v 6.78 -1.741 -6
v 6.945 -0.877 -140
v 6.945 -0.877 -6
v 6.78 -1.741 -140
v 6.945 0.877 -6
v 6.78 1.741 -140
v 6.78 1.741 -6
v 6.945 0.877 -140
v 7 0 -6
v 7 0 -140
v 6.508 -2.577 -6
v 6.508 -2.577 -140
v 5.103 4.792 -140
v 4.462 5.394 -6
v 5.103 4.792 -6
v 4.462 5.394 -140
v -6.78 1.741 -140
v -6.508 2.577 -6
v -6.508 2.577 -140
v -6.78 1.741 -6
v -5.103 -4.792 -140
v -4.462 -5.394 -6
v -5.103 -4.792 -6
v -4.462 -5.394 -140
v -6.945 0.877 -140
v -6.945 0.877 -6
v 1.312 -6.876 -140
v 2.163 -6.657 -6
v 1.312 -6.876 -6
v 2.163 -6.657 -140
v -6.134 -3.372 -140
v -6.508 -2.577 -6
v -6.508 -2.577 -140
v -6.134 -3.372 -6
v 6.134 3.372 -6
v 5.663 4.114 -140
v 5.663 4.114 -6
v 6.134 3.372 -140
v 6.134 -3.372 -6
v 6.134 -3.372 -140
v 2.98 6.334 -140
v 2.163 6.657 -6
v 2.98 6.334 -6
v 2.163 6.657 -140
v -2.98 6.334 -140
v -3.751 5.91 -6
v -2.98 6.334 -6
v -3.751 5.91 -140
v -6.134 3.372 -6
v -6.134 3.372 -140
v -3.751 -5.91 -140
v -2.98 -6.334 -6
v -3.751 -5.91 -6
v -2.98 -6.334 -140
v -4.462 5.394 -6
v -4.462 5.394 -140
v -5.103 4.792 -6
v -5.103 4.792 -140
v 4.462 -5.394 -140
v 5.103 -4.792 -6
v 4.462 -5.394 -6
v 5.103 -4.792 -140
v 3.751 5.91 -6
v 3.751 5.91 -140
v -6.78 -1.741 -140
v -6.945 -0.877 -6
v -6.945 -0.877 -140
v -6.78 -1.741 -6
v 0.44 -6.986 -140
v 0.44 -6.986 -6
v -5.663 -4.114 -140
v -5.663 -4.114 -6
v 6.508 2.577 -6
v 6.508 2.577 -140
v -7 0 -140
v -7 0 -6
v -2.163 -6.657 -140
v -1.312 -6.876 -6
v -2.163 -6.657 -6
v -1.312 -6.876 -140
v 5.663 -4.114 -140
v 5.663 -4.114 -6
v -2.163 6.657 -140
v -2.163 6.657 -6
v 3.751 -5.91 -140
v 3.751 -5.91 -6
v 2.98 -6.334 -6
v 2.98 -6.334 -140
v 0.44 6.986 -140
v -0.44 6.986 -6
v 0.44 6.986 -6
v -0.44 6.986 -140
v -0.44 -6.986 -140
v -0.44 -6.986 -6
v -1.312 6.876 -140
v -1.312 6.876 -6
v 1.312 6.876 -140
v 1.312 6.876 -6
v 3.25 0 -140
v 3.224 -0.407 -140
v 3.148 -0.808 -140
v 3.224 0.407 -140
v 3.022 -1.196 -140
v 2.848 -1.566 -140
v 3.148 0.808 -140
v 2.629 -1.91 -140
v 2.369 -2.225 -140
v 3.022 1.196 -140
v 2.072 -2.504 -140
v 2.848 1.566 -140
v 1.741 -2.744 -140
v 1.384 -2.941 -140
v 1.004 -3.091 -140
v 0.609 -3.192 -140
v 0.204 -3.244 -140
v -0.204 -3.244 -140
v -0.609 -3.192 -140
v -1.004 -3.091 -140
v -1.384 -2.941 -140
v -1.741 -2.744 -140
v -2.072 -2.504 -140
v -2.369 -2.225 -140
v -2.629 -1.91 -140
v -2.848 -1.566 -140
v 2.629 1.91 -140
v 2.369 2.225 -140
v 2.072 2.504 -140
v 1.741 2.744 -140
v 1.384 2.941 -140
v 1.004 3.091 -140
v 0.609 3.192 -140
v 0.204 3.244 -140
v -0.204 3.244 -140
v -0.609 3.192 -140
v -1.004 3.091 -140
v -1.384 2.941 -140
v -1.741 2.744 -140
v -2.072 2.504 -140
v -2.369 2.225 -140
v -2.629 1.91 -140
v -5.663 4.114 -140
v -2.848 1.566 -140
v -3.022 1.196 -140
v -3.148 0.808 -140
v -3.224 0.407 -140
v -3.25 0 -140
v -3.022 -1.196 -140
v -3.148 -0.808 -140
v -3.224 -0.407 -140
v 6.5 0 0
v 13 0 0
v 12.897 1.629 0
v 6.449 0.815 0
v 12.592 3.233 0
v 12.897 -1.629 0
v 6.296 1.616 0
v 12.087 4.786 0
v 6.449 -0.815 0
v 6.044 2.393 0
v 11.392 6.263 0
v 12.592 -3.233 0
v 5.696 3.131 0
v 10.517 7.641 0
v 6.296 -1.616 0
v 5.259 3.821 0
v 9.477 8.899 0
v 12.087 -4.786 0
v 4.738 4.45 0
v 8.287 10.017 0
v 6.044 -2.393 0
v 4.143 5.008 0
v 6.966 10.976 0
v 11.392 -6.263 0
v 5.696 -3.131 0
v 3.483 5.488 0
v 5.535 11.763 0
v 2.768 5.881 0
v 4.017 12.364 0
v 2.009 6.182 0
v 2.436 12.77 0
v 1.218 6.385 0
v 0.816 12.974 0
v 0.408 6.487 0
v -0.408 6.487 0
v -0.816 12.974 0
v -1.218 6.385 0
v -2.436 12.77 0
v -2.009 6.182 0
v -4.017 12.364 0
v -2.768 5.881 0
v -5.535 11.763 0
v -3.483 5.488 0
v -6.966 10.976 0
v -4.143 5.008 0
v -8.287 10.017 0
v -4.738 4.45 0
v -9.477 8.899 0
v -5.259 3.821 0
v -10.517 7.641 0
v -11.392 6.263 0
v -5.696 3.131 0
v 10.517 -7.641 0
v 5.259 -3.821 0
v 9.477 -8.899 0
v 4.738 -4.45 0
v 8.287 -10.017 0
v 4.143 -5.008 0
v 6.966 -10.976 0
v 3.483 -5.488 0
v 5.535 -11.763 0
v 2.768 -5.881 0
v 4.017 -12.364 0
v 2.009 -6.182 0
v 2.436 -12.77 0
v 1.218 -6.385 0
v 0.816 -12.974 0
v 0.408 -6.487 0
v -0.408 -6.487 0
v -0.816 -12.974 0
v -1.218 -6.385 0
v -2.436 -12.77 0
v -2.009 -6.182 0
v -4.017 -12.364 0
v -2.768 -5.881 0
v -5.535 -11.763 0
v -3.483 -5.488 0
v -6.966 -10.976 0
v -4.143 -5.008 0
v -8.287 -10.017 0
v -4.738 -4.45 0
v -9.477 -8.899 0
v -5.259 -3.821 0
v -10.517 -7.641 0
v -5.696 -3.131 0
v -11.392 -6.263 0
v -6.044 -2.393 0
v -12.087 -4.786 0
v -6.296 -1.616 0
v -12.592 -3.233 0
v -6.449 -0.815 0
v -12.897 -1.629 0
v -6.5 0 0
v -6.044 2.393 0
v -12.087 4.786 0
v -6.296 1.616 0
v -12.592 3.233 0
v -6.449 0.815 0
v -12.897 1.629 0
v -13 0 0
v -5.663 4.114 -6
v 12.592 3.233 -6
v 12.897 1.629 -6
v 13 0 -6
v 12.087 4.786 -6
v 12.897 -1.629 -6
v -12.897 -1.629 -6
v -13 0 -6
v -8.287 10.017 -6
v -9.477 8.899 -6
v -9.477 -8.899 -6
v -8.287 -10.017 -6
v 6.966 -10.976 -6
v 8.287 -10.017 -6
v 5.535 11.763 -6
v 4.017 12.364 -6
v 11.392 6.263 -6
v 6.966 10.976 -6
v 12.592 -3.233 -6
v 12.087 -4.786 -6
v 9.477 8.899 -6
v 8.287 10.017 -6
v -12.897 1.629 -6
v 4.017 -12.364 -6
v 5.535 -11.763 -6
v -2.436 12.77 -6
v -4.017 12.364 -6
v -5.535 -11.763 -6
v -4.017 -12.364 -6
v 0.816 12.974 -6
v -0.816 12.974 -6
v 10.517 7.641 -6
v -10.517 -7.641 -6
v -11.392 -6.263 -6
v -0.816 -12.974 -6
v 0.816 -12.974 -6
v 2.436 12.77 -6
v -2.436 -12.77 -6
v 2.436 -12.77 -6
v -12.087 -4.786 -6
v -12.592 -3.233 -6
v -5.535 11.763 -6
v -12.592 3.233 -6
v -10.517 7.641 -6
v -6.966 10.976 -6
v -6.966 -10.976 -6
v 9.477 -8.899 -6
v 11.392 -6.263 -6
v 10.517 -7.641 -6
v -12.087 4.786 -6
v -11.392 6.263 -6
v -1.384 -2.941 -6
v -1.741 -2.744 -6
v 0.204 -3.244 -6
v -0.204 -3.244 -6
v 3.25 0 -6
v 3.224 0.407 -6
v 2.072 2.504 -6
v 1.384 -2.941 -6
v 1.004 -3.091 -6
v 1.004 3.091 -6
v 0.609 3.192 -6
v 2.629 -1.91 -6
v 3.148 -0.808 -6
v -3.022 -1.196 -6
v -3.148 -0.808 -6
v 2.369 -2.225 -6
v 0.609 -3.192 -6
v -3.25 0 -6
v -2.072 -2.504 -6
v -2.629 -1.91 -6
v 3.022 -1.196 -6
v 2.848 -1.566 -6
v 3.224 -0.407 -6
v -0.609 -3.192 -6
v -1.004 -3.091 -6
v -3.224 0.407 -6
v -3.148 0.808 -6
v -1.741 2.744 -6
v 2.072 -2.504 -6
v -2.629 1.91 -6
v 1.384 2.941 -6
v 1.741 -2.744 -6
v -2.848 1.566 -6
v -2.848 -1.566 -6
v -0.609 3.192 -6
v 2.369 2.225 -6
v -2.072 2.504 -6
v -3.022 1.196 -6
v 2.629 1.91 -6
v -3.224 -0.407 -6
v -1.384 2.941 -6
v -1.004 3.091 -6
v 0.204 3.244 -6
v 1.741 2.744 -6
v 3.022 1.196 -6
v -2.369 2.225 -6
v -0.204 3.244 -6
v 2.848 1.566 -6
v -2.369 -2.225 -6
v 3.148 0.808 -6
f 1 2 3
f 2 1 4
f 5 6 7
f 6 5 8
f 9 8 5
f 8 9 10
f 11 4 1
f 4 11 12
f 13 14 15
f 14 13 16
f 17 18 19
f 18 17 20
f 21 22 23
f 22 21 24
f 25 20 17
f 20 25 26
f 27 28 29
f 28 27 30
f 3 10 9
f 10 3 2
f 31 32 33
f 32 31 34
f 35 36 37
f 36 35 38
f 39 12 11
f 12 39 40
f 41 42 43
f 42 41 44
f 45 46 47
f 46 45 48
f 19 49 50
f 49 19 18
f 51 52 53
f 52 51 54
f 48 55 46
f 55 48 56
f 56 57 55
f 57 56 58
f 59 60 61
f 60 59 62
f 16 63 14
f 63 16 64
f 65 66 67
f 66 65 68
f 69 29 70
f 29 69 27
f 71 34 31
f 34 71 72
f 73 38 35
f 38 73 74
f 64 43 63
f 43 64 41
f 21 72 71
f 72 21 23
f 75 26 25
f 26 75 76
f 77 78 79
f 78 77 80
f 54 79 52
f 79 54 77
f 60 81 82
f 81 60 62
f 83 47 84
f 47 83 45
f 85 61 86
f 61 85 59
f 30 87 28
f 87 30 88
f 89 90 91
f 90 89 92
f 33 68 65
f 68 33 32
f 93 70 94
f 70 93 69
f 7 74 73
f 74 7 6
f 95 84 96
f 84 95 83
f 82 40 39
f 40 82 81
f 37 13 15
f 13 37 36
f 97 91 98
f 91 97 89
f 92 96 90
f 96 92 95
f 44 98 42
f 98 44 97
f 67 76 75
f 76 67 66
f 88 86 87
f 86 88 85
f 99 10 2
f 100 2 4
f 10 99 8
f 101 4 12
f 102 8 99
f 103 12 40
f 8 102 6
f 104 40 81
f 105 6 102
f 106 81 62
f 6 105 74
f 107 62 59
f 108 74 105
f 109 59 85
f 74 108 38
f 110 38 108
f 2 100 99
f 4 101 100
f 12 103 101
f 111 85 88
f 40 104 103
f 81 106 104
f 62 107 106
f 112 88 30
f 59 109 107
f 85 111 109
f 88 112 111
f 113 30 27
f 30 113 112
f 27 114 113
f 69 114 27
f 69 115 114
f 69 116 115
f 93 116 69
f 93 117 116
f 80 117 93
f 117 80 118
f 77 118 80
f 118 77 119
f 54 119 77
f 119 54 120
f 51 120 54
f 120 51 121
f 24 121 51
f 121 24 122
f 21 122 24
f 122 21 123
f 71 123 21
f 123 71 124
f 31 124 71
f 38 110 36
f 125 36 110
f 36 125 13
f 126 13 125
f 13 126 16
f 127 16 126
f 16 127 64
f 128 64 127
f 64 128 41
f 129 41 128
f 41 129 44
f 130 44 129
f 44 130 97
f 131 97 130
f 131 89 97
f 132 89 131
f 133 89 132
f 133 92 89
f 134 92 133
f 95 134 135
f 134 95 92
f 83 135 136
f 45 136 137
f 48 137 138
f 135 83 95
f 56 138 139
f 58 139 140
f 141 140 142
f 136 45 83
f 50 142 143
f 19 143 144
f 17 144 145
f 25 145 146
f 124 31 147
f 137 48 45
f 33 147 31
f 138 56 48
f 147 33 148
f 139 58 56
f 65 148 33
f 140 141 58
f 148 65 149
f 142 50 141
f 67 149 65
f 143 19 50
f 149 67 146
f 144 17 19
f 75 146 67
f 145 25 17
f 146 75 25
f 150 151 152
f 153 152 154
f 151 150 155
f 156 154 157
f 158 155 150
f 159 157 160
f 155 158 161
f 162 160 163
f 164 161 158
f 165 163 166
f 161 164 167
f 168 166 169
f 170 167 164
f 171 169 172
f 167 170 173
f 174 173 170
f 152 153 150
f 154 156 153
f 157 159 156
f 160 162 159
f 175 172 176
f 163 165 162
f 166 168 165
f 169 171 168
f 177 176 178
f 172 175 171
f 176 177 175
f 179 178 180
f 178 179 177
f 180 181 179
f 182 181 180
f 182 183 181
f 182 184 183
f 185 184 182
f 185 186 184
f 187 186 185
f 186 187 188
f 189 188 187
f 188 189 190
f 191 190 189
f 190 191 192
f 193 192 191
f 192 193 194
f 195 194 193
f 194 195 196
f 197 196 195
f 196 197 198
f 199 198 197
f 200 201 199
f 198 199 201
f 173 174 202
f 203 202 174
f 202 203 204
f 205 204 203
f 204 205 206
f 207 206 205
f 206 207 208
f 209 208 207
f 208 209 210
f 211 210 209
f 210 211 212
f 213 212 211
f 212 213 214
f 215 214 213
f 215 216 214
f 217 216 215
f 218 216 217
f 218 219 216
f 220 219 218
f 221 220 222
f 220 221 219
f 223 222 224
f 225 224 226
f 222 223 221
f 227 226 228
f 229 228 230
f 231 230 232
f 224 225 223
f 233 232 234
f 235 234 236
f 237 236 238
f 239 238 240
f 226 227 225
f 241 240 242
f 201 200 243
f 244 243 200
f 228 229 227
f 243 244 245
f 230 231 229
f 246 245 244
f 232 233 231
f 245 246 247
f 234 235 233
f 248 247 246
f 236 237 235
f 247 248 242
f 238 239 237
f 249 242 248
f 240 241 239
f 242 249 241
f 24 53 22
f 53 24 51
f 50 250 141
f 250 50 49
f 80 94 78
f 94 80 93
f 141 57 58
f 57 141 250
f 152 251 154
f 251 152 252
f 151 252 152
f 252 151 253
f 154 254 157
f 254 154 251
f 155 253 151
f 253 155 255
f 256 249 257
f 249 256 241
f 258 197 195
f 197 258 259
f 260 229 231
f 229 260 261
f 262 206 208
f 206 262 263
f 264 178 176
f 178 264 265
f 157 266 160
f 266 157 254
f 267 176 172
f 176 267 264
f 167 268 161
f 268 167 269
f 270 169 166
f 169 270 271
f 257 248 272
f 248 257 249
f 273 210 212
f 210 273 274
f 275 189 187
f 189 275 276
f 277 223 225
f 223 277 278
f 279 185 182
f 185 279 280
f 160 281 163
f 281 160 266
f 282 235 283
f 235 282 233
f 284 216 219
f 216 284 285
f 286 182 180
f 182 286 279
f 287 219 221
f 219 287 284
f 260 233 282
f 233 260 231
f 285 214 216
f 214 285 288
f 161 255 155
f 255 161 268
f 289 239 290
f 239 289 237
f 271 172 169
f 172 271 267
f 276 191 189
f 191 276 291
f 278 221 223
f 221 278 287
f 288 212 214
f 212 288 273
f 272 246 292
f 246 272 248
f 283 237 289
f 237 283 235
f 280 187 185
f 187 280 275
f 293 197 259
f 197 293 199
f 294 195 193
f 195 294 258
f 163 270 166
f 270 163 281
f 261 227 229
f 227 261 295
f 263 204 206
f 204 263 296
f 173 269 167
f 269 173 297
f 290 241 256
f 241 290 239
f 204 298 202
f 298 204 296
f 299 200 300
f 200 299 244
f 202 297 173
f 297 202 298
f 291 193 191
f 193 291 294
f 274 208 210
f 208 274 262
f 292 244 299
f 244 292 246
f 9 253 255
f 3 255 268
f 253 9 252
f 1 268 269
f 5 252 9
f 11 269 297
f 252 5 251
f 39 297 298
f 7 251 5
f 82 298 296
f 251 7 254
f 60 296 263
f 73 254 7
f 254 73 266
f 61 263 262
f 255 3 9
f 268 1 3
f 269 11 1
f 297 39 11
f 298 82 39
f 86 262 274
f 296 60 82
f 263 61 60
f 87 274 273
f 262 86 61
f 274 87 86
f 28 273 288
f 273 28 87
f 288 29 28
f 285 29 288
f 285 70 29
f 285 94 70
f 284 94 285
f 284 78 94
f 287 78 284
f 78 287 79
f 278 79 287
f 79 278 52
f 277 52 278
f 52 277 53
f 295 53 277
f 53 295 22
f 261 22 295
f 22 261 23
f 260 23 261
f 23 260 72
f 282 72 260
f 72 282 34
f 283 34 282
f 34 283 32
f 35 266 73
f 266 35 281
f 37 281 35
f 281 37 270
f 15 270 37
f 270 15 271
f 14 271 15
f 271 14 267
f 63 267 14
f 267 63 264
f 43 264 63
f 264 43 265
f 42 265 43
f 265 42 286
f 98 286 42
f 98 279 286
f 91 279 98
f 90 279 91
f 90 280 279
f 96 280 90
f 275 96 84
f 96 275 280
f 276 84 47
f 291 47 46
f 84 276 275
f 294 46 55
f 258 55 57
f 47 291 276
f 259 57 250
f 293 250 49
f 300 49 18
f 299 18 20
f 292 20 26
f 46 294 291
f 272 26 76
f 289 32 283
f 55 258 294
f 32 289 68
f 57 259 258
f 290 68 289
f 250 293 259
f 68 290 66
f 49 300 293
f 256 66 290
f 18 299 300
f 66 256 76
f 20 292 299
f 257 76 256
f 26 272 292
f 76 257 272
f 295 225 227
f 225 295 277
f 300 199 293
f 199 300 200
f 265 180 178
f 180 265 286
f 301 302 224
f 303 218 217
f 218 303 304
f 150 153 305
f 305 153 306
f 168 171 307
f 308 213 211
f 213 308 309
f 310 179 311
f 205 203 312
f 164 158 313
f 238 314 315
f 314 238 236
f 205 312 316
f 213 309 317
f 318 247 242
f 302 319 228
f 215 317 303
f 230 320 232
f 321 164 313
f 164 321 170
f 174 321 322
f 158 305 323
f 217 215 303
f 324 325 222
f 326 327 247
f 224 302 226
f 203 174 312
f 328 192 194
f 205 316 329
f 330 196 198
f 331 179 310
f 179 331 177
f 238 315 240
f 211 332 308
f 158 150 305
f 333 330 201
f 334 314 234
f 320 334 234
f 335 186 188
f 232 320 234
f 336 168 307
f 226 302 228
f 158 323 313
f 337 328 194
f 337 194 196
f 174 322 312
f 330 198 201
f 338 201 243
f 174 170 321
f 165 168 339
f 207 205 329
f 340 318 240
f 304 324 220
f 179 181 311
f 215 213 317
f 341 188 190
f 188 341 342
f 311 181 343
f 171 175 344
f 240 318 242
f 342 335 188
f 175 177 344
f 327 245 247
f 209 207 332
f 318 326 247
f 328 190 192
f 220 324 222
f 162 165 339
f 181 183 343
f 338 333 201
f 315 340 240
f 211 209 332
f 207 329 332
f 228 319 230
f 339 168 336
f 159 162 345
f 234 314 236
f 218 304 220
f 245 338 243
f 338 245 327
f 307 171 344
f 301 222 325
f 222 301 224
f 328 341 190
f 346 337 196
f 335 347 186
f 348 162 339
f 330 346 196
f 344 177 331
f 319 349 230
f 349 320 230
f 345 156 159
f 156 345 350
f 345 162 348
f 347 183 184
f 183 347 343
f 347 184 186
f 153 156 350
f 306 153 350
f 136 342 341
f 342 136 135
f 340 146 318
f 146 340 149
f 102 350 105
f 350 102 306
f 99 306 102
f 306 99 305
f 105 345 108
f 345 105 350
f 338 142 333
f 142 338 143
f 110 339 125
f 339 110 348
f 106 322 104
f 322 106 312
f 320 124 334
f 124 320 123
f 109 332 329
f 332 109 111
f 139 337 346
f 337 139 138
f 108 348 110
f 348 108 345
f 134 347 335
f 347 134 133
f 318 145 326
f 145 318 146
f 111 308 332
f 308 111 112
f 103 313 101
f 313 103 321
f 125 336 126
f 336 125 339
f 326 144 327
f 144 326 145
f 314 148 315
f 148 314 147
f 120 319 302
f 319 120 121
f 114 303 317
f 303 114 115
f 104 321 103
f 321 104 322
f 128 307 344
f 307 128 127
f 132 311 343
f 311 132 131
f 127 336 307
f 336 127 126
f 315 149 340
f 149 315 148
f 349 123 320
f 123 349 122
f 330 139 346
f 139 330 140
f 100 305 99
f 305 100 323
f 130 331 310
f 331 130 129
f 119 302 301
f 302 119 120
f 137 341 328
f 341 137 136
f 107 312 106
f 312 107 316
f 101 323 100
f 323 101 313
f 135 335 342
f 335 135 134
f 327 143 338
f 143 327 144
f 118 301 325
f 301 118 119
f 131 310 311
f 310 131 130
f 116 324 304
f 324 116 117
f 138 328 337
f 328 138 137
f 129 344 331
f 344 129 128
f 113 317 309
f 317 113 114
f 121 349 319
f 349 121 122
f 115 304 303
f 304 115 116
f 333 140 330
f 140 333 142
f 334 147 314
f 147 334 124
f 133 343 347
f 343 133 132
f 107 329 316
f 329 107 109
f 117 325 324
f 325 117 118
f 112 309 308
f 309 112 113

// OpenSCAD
$fn = 50;


difference() {
	union() {
		translate(v = [0, 0, -140.0000000000]) {
			cylinder(h = 140, r = 7.0000000000);
		}
		translate(v = [0, 0, -6.0000000000]) {
			cylinder(h = 6, r = 13.0000000000);
		}
	}
	union() {
		translate(v = [0, 0, 0]) {
			rotate(a = [0, 0, 0]) {
				difference() {
					union() {
						#translate(v = [0, 0, -140.0000000000]) {
							cylinder(h = 140, r = 2.2500000000);
						}
						#translate(v = [0, 0, -6]) {
							cylinder(h = 6, r = 7.0000000000, r1 = 3.2500000000, r2 = 6.5000000000);
						}
						#translate(v = [0, 0, -140.0000000000]) {
							cylinder(h = 140, r = 3.2500000000);
						}
						#translate(v = [0, 0, -140.0000000000]) {
							cylinder(h = 140, r = 2.2500000000);
						}
					}
					union();
				}
			}
		}
	}
}
